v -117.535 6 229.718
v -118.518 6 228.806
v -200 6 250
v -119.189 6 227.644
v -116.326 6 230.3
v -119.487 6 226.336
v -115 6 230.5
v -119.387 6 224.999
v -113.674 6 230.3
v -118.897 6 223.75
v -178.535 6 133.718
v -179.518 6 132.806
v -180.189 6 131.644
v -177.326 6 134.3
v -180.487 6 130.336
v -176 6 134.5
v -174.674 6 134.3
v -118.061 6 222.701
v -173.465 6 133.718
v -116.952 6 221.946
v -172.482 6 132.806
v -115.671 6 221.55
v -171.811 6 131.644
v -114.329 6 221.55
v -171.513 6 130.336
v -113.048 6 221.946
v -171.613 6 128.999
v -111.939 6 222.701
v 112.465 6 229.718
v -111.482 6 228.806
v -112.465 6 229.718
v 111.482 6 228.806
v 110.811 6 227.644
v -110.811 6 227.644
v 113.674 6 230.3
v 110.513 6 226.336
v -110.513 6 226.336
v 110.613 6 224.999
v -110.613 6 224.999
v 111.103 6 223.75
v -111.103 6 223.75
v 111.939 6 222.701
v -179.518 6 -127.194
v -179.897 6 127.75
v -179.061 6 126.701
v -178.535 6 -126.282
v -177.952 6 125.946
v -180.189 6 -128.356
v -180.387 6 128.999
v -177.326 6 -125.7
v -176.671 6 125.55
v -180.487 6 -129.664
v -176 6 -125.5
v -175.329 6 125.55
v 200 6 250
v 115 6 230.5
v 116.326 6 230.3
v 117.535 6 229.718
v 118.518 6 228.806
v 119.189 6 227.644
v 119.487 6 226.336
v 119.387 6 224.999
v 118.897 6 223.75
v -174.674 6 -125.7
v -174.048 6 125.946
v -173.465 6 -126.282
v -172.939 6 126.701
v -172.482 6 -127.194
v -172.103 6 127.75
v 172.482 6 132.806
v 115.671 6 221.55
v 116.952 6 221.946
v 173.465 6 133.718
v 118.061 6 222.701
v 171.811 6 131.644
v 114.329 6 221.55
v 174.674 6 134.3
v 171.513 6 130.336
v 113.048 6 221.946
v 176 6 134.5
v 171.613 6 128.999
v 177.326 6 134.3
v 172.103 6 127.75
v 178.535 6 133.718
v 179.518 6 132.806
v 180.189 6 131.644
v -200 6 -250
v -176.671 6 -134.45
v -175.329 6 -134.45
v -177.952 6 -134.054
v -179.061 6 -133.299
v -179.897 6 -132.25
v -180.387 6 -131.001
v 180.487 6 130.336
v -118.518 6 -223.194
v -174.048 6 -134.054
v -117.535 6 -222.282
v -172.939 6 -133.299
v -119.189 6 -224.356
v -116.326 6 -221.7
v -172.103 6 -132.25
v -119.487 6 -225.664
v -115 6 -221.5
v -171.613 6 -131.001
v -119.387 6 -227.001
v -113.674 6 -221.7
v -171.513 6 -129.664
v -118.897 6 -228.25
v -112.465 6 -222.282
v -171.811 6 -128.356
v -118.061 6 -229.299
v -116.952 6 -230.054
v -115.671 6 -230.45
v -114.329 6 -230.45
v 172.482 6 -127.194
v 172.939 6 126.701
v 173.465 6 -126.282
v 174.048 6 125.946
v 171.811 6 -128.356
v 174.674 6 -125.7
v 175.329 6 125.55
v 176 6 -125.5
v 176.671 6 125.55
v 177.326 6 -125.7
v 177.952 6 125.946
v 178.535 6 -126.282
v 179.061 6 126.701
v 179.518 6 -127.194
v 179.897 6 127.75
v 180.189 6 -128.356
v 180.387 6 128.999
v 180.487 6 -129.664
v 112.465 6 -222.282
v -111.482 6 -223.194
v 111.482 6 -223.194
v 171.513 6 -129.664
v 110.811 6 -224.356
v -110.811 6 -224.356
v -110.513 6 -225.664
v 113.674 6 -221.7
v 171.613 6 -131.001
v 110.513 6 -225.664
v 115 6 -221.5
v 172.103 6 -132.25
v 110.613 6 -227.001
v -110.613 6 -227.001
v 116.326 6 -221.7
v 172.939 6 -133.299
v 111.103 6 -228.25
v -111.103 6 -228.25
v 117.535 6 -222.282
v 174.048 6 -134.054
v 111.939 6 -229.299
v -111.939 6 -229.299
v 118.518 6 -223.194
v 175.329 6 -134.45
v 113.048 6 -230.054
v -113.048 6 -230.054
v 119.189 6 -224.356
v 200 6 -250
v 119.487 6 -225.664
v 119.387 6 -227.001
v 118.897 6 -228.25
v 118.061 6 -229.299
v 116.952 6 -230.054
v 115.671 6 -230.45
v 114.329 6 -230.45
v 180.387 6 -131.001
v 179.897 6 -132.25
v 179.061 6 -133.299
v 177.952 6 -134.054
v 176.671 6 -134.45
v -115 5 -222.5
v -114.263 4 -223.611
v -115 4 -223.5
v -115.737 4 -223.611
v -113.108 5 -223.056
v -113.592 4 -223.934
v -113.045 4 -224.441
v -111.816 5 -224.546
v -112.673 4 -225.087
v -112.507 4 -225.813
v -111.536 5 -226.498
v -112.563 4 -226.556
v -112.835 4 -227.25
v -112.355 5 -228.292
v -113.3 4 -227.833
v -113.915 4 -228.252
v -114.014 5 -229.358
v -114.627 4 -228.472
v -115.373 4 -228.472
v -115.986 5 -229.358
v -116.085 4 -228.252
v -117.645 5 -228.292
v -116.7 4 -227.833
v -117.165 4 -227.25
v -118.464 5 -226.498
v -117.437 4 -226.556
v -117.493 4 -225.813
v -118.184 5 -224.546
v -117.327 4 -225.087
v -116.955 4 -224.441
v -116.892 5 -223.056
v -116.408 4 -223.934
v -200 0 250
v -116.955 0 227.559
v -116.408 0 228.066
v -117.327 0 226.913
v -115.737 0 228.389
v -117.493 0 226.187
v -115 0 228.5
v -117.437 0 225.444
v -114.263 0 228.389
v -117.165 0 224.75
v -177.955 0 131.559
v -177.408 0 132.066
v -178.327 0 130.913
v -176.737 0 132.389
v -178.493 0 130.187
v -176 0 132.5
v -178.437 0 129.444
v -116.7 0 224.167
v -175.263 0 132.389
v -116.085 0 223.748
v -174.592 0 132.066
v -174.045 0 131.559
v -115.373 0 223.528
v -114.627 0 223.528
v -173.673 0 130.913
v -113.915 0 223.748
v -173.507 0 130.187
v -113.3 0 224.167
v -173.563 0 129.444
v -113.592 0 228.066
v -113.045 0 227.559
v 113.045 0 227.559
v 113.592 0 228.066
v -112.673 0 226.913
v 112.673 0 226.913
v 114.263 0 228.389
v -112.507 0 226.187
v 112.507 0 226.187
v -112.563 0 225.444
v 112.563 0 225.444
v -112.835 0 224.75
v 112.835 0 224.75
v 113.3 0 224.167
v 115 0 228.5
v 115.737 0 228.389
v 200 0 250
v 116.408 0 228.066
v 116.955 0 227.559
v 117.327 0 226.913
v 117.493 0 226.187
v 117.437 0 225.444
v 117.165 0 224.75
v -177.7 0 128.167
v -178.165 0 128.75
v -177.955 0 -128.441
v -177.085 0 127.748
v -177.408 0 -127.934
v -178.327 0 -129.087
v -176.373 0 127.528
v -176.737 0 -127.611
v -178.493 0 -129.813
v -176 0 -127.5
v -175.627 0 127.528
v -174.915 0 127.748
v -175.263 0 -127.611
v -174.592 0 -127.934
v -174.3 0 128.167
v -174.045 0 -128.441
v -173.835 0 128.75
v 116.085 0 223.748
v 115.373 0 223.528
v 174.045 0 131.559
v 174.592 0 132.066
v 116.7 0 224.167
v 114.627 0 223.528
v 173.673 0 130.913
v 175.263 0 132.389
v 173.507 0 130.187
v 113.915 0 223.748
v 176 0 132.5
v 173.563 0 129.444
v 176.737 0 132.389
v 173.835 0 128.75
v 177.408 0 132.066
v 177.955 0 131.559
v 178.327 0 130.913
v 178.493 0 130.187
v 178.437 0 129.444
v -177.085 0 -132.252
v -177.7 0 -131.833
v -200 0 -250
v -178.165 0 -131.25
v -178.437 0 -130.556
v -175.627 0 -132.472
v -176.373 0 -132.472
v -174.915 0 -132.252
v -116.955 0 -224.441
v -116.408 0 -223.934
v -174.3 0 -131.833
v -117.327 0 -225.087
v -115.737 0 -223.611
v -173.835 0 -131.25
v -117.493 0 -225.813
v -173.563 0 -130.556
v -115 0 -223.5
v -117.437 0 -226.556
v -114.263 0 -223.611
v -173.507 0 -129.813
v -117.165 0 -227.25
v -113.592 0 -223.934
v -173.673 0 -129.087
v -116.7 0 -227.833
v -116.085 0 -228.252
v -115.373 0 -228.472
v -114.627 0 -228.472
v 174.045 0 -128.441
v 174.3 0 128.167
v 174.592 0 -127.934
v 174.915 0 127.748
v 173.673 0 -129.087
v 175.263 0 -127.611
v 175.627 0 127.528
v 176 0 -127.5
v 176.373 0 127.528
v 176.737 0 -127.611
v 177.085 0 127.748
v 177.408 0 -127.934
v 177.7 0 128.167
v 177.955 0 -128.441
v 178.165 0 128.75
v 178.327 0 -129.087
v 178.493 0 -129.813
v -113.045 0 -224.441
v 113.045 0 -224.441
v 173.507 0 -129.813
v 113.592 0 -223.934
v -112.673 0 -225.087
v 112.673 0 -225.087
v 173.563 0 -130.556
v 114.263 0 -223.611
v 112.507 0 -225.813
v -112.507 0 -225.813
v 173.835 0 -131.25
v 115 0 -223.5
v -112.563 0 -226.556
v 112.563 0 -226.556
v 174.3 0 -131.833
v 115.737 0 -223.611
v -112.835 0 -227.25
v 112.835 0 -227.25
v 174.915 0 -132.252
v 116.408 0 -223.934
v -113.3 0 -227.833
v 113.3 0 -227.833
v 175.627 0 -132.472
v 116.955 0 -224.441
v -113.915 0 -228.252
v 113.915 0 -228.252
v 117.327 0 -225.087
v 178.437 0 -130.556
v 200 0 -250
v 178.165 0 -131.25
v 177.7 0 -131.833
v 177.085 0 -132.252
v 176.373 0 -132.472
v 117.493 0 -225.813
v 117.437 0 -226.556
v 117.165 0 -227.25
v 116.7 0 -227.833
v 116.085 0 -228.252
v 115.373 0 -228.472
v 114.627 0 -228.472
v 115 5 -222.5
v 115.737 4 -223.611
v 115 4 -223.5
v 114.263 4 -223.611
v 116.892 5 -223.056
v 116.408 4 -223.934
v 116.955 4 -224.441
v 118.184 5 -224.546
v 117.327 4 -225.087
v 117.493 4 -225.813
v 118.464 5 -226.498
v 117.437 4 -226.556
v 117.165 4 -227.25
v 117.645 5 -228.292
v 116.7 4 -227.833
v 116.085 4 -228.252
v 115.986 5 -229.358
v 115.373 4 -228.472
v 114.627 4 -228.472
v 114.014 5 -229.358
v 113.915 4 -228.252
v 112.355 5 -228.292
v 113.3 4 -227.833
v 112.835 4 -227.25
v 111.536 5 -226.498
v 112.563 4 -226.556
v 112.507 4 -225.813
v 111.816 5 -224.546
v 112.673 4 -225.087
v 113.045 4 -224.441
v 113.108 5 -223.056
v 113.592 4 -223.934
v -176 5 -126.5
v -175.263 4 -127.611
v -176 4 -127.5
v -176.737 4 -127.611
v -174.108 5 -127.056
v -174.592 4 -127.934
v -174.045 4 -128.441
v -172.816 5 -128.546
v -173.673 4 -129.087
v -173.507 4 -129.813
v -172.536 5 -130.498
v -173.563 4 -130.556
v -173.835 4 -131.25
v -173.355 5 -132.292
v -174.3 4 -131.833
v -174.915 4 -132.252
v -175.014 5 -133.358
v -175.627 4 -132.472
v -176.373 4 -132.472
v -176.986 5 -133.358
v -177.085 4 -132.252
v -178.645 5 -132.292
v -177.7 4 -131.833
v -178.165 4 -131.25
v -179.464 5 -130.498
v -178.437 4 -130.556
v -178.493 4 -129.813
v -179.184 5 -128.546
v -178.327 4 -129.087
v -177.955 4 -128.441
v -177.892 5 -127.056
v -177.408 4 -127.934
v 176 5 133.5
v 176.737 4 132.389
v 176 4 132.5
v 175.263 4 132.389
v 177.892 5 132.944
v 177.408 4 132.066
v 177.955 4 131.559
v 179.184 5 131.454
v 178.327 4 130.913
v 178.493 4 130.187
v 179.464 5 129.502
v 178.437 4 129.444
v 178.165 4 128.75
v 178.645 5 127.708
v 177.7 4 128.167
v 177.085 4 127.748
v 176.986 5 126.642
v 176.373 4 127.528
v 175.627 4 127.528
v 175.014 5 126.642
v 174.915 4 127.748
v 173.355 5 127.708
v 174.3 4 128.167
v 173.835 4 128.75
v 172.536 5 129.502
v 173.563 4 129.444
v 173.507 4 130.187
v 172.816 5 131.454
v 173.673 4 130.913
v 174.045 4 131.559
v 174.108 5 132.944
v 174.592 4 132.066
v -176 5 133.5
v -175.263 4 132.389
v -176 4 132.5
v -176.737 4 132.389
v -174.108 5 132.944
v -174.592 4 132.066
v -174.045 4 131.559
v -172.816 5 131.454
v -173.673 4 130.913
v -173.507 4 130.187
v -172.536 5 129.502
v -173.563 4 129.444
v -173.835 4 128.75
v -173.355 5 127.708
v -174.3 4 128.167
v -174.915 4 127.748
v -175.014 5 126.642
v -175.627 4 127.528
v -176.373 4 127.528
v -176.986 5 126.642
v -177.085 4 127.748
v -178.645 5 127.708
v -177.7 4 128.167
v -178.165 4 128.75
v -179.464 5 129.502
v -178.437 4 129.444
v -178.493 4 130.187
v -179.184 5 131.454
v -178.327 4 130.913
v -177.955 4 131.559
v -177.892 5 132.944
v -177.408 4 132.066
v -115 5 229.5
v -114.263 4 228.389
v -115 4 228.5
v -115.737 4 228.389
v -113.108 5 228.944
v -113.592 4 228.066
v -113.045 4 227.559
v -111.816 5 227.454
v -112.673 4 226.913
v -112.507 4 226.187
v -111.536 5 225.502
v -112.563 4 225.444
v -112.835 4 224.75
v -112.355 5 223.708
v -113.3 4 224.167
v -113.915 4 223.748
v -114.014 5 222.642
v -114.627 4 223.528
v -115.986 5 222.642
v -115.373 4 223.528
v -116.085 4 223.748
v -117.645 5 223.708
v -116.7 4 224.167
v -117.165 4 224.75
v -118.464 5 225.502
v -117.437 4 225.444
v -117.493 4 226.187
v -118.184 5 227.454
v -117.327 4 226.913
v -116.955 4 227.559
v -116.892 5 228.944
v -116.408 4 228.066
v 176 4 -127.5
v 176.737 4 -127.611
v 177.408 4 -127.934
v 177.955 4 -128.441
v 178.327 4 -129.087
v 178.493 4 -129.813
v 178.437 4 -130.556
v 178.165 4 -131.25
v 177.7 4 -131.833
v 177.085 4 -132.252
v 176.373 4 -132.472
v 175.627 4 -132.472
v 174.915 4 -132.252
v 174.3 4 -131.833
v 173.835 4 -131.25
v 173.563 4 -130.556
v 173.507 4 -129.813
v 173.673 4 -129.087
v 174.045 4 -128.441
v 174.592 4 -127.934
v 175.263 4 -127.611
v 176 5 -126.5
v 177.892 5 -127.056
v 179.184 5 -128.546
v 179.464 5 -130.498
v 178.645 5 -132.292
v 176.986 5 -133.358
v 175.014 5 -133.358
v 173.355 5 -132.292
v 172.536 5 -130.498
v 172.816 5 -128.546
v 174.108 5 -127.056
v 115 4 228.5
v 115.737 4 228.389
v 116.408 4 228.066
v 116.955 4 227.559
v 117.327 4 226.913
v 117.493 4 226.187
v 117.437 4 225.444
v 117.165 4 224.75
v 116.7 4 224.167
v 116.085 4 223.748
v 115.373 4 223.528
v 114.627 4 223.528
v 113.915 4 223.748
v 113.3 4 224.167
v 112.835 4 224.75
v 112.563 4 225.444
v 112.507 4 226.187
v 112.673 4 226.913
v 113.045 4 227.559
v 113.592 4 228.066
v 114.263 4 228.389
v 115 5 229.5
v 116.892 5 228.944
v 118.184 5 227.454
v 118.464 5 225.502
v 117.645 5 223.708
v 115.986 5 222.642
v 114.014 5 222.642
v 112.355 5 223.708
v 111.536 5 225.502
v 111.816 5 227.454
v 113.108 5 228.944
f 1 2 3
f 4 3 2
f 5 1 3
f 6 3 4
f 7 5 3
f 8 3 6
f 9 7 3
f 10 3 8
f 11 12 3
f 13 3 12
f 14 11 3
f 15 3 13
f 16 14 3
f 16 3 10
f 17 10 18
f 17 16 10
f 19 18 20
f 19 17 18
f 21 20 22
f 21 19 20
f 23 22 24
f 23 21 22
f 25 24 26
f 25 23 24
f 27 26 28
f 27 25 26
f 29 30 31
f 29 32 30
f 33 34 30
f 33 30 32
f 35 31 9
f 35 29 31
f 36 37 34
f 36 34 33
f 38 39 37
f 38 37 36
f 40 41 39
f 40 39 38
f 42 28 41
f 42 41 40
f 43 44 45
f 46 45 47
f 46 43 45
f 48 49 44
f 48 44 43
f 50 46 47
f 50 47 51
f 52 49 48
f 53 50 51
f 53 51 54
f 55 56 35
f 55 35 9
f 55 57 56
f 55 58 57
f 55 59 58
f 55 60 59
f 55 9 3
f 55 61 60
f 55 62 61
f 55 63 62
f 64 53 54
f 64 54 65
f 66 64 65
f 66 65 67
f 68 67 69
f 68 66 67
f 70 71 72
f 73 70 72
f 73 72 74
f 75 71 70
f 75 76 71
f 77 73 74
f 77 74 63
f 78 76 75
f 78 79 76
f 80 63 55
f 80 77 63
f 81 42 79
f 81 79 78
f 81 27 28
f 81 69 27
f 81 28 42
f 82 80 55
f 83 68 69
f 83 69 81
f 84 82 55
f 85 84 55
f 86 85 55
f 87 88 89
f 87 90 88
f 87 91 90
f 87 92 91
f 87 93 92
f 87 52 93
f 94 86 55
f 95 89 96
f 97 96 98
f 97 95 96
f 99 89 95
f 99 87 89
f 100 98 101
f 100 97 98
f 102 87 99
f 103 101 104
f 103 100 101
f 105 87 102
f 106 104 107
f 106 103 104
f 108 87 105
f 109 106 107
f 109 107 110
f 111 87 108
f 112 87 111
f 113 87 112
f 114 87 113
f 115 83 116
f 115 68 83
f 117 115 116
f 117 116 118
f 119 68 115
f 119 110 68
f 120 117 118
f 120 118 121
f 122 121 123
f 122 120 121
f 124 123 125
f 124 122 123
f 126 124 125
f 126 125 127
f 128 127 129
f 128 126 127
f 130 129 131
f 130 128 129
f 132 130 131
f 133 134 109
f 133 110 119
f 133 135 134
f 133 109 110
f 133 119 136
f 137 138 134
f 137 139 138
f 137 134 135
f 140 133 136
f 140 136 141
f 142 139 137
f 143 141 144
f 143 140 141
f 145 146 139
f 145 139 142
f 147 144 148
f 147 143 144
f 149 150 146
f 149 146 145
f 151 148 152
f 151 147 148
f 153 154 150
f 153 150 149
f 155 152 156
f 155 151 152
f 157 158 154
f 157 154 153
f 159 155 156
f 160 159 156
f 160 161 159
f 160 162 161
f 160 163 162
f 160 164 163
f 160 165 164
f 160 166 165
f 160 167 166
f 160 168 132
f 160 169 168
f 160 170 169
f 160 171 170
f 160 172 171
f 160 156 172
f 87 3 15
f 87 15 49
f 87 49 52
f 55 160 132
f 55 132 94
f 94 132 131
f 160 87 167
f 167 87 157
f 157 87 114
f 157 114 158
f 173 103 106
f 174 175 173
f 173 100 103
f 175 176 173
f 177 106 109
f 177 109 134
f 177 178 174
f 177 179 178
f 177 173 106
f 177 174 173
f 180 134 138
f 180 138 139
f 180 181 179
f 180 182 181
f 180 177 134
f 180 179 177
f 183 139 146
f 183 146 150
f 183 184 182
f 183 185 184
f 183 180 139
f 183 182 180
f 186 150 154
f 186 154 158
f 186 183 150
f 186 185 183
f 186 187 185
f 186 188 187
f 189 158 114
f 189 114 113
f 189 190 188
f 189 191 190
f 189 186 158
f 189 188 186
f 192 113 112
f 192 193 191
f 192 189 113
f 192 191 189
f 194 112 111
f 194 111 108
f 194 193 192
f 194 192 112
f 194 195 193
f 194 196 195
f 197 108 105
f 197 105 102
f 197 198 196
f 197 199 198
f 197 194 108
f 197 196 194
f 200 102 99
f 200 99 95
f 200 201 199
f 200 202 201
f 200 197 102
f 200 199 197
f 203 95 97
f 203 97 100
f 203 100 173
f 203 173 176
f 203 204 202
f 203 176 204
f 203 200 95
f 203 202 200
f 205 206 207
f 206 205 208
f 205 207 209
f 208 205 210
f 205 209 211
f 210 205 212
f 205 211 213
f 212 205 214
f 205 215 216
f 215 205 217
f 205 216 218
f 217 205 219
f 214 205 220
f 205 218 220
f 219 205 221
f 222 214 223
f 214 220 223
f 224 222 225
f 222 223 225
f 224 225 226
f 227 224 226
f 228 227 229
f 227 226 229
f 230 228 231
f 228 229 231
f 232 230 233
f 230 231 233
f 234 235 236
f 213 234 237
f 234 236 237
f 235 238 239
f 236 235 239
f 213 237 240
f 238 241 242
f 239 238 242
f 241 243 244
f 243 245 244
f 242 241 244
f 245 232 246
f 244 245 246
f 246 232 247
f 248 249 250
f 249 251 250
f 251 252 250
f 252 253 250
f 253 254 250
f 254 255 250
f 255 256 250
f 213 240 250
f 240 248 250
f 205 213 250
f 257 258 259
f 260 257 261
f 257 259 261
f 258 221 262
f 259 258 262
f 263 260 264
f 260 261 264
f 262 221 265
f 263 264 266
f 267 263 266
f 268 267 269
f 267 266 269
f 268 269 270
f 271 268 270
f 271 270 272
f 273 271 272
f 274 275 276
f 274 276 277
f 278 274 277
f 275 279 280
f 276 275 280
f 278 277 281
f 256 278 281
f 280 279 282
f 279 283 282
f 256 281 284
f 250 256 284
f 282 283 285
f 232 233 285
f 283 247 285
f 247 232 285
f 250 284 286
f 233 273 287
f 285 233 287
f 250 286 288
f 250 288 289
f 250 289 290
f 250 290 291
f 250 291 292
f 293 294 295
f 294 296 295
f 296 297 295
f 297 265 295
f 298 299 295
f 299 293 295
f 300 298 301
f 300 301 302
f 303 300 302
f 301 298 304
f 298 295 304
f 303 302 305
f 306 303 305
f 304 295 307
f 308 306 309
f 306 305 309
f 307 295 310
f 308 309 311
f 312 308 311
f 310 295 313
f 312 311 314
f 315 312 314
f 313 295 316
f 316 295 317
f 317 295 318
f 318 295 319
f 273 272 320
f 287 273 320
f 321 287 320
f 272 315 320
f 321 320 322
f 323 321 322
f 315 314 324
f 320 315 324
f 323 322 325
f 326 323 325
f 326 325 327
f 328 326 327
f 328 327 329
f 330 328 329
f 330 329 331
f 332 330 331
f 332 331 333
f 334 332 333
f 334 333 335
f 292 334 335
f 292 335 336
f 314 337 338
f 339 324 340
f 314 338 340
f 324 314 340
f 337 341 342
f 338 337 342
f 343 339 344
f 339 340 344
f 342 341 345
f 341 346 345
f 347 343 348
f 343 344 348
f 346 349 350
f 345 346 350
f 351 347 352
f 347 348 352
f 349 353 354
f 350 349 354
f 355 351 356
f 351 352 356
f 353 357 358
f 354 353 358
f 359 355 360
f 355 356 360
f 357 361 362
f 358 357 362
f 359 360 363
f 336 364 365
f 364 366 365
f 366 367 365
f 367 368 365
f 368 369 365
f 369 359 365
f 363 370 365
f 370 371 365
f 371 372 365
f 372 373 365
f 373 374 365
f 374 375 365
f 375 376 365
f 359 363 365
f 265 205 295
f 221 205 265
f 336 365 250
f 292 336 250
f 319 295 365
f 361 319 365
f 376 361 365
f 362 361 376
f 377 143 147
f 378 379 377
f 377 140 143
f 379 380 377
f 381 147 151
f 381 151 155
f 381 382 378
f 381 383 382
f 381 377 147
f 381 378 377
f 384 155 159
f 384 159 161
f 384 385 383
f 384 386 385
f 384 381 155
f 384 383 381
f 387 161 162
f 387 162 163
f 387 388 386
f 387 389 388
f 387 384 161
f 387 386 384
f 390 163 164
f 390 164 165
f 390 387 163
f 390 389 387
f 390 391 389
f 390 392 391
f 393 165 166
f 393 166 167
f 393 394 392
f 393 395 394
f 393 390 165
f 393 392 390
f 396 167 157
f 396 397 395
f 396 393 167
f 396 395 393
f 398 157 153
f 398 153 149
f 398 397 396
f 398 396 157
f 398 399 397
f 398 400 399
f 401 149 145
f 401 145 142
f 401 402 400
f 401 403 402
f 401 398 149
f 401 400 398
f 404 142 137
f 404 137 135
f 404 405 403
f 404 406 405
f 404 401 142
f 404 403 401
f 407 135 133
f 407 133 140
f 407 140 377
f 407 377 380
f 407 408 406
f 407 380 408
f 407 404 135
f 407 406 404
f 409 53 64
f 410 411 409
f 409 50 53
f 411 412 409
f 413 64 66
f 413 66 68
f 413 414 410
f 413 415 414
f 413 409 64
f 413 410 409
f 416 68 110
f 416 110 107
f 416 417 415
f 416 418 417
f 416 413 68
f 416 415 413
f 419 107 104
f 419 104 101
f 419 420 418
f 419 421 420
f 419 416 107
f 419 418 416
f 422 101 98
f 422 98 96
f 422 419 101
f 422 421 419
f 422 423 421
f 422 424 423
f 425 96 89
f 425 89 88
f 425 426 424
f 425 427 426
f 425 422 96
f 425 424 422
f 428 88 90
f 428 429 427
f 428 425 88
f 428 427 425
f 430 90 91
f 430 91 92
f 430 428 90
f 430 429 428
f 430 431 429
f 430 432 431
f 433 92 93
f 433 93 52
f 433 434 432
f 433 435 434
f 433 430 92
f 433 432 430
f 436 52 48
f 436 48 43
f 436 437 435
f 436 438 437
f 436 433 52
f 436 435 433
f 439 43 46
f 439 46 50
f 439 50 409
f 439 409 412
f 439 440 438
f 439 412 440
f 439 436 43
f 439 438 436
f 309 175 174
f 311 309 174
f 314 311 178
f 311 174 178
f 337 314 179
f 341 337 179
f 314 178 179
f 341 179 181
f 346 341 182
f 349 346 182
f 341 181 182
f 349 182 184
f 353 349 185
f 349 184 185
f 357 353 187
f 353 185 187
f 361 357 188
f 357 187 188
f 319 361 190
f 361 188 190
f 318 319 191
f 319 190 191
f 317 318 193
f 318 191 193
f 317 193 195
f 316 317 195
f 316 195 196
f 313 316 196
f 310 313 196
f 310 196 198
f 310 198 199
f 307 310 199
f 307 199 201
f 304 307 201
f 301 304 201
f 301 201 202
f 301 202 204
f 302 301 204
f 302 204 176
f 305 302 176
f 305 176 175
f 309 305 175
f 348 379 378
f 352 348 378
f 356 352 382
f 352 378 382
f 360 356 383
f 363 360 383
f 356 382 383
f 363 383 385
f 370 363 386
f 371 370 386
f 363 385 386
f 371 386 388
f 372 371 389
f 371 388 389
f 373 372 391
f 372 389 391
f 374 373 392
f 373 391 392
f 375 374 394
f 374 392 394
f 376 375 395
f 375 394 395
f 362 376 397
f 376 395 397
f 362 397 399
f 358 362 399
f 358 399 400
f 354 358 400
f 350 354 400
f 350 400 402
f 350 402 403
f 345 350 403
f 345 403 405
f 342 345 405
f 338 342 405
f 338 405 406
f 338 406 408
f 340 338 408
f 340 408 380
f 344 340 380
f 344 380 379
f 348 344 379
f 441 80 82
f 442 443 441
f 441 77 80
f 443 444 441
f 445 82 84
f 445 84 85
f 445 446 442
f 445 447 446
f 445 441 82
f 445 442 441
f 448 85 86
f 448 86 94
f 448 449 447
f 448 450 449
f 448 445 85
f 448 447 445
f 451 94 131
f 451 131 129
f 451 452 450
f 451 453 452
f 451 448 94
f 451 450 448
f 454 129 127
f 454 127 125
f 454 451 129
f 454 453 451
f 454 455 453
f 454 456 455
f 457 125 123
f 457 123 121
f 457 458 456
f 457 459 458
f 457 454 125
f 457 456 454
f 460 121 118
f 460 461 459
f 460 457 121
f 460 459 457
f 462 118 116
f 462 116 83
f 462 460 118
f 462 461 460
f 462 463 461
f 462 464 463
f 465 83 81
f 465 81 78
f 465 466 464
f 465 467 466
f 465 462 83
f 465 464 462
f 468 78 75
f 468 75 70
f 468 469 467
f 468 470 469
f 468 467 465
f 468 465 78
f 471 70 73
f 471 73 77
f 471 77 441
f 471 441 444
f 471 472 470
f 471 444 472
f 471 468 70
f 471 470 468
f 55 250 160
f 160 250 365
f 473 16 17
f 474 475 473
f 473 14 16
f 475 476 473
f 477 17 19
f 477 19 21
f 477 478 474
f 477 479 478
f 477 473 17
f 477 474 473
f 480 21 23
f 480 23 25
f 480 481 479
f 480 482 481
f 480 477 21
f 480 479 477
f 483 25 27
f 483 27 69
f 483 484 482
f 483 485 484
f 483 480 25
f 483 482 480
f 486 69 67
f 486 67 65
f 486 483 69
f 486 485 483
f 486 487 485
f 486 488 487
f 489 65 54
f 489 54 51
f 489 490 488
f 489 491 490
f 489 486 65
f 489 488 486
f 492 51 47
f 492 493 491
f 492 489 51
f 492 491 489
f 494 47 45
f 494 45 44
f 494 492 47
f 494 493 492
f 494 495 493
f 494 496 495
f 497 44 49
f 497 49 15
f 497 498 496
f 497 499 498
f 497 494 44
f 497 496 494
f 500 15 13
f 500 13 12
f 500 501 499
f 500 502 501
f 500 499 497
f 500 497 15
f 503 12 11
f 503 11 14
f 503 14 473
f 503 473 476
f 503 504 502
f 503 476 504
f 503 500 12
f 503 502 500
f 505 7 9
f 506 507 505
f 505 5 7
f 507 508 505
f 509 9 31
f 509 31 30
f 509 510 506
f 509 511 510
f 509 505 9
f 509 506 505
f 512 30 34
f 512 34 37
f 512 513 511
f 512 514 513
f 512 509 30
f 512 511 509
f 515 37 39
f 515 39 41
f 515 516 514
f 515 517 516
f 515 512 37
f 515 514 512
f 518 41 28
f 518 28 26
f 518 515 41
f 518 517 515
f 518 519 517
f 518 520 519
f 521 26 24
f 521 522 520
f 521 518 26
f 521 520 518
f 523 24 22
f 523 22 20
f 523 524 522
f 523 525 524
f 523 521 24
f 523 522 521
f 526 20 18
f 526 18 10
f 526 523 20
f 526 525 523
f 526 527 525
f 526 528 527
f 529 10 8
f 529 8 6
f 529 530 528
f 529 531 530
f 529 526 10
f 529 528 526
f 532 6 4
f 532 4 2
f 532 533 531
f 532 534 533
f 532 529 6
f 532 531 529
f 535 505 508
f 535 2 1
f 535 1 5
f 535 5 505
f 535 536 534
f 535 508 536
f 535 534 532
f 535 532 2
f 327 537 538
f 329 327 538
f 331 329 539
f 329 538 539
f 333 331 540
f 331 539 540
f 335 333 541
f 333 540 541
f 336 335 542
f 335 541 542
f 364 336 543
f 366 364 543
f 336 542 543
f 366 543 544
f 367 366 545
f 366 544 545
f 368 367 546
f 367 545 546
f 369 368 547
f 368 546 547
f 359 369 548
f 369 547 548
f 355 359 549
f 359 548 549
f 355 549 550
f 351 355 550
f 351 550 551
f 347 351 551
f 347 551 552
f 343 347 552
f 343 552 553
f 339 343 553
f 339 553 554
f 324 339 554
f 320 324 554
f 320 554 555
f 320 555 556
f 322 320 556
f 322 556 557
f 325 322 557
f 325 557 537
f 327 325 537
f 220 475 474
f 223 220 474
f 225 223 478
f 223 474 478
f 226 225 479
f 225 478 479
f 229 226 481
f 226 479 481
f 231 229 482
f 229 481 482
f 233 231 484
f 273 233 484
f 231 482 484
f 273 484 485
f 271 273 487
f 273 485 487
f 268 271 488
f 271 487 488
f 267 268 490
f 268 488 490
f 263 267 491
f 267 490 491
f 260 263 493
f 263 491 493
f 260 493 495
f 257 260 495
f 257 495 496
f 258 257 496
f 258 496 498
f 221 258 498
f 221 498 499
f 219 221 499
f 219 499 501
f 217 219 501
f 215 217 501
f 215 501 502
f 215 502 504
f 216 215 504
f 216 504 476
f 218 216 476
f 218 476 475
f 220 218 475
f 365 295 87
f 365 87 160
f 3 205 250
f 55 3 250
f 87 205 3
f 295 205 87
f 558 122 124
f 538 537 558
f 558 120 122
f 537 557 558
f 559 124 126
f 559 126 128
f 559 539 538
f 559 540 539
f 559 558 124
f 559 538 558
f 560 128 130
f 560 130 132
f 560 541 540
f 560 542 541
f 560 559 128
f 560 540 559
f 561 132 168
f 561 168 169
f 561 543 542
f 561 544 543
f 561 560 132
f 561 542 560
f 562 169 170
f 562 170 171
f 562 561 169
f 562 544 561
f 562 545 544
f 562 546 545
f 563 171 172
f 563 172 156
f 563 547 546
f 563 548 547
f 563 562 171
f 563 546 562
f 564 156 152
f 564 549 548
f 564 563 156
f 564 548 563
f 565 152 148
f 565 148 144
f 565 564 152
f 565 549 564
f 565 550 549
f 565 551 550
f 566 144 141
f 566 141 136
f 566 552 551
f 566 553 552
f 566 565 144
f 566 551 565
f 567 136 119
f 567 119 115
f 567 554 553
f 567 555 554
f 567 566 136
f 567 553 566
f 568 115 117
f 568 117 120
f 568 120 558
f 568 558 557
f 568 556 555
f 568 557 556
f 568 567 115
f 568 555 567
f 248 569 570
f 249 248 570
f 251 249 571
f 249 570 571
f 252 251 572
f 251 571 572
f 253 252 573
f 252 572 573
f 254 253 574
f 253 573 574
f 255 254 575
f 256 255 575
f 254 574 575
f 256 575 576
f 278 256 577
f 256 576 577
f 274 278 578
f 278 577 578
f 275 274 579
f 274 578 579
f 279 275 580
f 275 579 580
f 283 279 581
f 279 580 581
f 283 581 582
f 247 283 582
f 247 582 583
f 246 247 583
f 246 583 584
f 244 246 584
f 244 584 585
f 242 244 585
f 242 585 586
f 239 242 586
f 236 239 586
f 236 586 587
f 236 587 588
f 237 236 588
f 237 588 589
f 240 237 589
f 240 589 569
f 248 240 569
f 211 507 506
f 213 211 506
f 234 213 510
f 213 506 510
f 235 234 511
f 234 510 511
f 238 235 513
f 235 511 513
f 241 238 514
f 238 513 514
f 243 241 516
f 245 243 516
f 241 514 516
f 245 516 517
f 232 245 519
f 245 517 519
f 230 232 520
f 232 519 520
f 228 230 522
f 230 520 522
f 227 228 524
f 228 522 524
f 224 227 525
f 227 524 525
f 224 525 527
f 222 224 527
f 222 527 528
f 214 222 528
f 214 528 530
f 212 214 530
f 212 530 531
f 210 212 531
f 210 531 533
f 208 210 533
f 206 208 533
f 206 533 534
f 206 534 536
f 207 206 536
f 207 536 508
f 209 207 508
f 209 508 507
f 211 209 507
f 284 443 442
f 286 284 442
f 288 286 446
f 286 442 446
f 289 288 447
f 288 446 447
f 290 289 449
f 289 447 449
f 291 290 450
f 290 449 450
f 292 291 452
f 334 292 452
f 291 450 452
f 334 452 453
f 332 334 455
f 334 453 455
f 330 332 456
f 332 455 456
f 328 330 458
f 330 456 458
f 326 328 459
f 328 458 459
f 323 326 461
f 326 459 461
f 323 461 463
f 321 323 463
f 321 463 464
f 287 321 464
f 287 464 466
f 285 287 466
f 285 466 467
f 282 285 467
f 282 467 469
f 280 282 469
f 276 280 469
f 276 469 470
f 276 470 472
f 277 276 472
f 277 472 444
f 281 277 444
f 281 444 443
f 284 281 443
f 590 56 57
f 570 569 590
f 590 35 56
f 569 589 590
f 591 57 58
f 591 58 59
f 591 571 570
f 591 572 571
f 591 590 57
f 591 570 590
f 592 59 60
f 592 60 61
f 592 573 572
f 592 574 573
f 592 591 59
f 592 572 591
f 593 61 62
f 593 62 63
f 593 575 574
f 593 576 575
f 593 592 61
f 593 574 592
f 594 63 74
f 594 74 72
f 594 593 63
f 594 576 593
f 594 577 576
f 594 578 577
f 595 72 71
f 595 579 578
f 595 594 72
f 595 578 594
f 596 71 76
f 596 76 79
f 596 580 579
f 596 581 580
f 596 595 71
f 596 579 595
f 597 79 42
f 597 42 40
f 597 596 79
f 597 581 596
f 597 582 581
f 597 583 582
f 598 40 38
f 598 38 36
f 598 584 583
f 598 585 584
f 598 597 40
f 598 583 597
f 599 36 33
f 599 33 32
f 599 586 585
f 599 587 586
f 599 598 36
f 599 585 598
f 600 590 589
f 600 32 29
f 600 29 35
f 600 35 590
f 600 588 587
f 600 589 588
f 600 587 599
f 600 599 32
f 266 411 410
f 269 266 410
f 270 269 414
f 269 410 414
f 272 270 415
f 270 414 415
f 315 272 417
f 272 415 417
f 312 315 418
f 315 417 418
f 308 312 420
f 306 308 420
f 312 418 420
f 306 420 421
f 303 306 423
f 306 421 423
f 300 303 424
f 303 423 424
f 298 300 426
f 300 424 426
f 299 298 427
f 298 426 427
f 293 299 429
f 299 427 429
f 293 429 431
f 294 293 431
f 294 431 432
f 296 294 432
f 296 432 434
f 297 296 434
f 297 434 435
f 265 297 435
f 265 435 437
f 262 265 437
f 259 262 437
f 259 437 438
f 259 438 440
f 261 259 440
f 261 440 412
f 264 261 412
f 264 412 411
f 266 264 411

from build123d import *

# Parameters (mm, degrees)
ESQUISSE1_W             = 400
ESQUISSE1_H             = 500
BOSS_EXTRU_1_DEPTH      = 6
ESQUISSE2_R             = 2.5
ENL_V_MAT_EXTRU_1_DEPTH = 321.21242949
CHANFREIN1_SIZE         = 2


with BuildPart() as part:
    # Esquisse1 → Boss.-Extru.1 (new body)
    with BuildSketch(Plane(origin=(0, 0, 0), x_dir=(1, 0, 0), z_dir=(0, 1, 0))):
        Rectangle(ESQUISSE1_W, ESQUISSE1_H)
    extrude(amount=BOSS_EXTRU_1_DEPTH)

    # Esquisse2 → Enlèv. mat.-Extru.1 (cut, through all)
    with BuildSketch(Plane(origin=(0, 6, 0), x_dir=(1, 0, 0), z_dir=(0, 1, 0))):
        with Locations(Location((-176, 130, 0), (0, 0, 270))):
            Circle(ESQUISSE2_R)
        with Locations(Location((176, 130, 0), (0, 0, 270))):
            Circle(ESQUISSE2_R)
        with Locations(Location((-176, -130, 0), (0, 0, 270))):
            Circle(ESQUISSE2_R)
        with Locations(Location((176, -130, 0), (0, 0, 270))):
            Circle(ESQUISSE2_R)
        with Locations(Location((-115, 226, 0), (0, 0, 270))):
            Circle(ESQUISSE2_R)
        with Locations(Location((115, 226, 0), (0, 0, 270))):
            Circle(ESQUISSE2_R)
        with Locations(Location((-115, -226, 0), (0, 0, 270))):
            Circle(ESQUISSE2_R)
        with Locations(Location((115, -226, 0), (0, 0, 270))):
            Circle(ESQUISSE2_R)
    extrude(amount=-ENL_V_MAT_EXTRU_1_DEPTH, mode=Mode.SUBTRACT)

    # Chanfrein1
    chanfrein1_edges = [part.edges().sort_by_distance(p)[0] for p in [
        (-115, 6, -228.5),
        (176, 6, 127.5),
        (-176, 6, 127.5),
        (176, 6, -132.5),
        (115, 6, 223.5),
        (-115, 6, 223.5),
        (115, 6, -228.5),
        (-176, 6, -132.5),
    ]]
    chamfer(chanfrein1_edges, length=CHANFREIN1_SIZE)


solid = part.part
